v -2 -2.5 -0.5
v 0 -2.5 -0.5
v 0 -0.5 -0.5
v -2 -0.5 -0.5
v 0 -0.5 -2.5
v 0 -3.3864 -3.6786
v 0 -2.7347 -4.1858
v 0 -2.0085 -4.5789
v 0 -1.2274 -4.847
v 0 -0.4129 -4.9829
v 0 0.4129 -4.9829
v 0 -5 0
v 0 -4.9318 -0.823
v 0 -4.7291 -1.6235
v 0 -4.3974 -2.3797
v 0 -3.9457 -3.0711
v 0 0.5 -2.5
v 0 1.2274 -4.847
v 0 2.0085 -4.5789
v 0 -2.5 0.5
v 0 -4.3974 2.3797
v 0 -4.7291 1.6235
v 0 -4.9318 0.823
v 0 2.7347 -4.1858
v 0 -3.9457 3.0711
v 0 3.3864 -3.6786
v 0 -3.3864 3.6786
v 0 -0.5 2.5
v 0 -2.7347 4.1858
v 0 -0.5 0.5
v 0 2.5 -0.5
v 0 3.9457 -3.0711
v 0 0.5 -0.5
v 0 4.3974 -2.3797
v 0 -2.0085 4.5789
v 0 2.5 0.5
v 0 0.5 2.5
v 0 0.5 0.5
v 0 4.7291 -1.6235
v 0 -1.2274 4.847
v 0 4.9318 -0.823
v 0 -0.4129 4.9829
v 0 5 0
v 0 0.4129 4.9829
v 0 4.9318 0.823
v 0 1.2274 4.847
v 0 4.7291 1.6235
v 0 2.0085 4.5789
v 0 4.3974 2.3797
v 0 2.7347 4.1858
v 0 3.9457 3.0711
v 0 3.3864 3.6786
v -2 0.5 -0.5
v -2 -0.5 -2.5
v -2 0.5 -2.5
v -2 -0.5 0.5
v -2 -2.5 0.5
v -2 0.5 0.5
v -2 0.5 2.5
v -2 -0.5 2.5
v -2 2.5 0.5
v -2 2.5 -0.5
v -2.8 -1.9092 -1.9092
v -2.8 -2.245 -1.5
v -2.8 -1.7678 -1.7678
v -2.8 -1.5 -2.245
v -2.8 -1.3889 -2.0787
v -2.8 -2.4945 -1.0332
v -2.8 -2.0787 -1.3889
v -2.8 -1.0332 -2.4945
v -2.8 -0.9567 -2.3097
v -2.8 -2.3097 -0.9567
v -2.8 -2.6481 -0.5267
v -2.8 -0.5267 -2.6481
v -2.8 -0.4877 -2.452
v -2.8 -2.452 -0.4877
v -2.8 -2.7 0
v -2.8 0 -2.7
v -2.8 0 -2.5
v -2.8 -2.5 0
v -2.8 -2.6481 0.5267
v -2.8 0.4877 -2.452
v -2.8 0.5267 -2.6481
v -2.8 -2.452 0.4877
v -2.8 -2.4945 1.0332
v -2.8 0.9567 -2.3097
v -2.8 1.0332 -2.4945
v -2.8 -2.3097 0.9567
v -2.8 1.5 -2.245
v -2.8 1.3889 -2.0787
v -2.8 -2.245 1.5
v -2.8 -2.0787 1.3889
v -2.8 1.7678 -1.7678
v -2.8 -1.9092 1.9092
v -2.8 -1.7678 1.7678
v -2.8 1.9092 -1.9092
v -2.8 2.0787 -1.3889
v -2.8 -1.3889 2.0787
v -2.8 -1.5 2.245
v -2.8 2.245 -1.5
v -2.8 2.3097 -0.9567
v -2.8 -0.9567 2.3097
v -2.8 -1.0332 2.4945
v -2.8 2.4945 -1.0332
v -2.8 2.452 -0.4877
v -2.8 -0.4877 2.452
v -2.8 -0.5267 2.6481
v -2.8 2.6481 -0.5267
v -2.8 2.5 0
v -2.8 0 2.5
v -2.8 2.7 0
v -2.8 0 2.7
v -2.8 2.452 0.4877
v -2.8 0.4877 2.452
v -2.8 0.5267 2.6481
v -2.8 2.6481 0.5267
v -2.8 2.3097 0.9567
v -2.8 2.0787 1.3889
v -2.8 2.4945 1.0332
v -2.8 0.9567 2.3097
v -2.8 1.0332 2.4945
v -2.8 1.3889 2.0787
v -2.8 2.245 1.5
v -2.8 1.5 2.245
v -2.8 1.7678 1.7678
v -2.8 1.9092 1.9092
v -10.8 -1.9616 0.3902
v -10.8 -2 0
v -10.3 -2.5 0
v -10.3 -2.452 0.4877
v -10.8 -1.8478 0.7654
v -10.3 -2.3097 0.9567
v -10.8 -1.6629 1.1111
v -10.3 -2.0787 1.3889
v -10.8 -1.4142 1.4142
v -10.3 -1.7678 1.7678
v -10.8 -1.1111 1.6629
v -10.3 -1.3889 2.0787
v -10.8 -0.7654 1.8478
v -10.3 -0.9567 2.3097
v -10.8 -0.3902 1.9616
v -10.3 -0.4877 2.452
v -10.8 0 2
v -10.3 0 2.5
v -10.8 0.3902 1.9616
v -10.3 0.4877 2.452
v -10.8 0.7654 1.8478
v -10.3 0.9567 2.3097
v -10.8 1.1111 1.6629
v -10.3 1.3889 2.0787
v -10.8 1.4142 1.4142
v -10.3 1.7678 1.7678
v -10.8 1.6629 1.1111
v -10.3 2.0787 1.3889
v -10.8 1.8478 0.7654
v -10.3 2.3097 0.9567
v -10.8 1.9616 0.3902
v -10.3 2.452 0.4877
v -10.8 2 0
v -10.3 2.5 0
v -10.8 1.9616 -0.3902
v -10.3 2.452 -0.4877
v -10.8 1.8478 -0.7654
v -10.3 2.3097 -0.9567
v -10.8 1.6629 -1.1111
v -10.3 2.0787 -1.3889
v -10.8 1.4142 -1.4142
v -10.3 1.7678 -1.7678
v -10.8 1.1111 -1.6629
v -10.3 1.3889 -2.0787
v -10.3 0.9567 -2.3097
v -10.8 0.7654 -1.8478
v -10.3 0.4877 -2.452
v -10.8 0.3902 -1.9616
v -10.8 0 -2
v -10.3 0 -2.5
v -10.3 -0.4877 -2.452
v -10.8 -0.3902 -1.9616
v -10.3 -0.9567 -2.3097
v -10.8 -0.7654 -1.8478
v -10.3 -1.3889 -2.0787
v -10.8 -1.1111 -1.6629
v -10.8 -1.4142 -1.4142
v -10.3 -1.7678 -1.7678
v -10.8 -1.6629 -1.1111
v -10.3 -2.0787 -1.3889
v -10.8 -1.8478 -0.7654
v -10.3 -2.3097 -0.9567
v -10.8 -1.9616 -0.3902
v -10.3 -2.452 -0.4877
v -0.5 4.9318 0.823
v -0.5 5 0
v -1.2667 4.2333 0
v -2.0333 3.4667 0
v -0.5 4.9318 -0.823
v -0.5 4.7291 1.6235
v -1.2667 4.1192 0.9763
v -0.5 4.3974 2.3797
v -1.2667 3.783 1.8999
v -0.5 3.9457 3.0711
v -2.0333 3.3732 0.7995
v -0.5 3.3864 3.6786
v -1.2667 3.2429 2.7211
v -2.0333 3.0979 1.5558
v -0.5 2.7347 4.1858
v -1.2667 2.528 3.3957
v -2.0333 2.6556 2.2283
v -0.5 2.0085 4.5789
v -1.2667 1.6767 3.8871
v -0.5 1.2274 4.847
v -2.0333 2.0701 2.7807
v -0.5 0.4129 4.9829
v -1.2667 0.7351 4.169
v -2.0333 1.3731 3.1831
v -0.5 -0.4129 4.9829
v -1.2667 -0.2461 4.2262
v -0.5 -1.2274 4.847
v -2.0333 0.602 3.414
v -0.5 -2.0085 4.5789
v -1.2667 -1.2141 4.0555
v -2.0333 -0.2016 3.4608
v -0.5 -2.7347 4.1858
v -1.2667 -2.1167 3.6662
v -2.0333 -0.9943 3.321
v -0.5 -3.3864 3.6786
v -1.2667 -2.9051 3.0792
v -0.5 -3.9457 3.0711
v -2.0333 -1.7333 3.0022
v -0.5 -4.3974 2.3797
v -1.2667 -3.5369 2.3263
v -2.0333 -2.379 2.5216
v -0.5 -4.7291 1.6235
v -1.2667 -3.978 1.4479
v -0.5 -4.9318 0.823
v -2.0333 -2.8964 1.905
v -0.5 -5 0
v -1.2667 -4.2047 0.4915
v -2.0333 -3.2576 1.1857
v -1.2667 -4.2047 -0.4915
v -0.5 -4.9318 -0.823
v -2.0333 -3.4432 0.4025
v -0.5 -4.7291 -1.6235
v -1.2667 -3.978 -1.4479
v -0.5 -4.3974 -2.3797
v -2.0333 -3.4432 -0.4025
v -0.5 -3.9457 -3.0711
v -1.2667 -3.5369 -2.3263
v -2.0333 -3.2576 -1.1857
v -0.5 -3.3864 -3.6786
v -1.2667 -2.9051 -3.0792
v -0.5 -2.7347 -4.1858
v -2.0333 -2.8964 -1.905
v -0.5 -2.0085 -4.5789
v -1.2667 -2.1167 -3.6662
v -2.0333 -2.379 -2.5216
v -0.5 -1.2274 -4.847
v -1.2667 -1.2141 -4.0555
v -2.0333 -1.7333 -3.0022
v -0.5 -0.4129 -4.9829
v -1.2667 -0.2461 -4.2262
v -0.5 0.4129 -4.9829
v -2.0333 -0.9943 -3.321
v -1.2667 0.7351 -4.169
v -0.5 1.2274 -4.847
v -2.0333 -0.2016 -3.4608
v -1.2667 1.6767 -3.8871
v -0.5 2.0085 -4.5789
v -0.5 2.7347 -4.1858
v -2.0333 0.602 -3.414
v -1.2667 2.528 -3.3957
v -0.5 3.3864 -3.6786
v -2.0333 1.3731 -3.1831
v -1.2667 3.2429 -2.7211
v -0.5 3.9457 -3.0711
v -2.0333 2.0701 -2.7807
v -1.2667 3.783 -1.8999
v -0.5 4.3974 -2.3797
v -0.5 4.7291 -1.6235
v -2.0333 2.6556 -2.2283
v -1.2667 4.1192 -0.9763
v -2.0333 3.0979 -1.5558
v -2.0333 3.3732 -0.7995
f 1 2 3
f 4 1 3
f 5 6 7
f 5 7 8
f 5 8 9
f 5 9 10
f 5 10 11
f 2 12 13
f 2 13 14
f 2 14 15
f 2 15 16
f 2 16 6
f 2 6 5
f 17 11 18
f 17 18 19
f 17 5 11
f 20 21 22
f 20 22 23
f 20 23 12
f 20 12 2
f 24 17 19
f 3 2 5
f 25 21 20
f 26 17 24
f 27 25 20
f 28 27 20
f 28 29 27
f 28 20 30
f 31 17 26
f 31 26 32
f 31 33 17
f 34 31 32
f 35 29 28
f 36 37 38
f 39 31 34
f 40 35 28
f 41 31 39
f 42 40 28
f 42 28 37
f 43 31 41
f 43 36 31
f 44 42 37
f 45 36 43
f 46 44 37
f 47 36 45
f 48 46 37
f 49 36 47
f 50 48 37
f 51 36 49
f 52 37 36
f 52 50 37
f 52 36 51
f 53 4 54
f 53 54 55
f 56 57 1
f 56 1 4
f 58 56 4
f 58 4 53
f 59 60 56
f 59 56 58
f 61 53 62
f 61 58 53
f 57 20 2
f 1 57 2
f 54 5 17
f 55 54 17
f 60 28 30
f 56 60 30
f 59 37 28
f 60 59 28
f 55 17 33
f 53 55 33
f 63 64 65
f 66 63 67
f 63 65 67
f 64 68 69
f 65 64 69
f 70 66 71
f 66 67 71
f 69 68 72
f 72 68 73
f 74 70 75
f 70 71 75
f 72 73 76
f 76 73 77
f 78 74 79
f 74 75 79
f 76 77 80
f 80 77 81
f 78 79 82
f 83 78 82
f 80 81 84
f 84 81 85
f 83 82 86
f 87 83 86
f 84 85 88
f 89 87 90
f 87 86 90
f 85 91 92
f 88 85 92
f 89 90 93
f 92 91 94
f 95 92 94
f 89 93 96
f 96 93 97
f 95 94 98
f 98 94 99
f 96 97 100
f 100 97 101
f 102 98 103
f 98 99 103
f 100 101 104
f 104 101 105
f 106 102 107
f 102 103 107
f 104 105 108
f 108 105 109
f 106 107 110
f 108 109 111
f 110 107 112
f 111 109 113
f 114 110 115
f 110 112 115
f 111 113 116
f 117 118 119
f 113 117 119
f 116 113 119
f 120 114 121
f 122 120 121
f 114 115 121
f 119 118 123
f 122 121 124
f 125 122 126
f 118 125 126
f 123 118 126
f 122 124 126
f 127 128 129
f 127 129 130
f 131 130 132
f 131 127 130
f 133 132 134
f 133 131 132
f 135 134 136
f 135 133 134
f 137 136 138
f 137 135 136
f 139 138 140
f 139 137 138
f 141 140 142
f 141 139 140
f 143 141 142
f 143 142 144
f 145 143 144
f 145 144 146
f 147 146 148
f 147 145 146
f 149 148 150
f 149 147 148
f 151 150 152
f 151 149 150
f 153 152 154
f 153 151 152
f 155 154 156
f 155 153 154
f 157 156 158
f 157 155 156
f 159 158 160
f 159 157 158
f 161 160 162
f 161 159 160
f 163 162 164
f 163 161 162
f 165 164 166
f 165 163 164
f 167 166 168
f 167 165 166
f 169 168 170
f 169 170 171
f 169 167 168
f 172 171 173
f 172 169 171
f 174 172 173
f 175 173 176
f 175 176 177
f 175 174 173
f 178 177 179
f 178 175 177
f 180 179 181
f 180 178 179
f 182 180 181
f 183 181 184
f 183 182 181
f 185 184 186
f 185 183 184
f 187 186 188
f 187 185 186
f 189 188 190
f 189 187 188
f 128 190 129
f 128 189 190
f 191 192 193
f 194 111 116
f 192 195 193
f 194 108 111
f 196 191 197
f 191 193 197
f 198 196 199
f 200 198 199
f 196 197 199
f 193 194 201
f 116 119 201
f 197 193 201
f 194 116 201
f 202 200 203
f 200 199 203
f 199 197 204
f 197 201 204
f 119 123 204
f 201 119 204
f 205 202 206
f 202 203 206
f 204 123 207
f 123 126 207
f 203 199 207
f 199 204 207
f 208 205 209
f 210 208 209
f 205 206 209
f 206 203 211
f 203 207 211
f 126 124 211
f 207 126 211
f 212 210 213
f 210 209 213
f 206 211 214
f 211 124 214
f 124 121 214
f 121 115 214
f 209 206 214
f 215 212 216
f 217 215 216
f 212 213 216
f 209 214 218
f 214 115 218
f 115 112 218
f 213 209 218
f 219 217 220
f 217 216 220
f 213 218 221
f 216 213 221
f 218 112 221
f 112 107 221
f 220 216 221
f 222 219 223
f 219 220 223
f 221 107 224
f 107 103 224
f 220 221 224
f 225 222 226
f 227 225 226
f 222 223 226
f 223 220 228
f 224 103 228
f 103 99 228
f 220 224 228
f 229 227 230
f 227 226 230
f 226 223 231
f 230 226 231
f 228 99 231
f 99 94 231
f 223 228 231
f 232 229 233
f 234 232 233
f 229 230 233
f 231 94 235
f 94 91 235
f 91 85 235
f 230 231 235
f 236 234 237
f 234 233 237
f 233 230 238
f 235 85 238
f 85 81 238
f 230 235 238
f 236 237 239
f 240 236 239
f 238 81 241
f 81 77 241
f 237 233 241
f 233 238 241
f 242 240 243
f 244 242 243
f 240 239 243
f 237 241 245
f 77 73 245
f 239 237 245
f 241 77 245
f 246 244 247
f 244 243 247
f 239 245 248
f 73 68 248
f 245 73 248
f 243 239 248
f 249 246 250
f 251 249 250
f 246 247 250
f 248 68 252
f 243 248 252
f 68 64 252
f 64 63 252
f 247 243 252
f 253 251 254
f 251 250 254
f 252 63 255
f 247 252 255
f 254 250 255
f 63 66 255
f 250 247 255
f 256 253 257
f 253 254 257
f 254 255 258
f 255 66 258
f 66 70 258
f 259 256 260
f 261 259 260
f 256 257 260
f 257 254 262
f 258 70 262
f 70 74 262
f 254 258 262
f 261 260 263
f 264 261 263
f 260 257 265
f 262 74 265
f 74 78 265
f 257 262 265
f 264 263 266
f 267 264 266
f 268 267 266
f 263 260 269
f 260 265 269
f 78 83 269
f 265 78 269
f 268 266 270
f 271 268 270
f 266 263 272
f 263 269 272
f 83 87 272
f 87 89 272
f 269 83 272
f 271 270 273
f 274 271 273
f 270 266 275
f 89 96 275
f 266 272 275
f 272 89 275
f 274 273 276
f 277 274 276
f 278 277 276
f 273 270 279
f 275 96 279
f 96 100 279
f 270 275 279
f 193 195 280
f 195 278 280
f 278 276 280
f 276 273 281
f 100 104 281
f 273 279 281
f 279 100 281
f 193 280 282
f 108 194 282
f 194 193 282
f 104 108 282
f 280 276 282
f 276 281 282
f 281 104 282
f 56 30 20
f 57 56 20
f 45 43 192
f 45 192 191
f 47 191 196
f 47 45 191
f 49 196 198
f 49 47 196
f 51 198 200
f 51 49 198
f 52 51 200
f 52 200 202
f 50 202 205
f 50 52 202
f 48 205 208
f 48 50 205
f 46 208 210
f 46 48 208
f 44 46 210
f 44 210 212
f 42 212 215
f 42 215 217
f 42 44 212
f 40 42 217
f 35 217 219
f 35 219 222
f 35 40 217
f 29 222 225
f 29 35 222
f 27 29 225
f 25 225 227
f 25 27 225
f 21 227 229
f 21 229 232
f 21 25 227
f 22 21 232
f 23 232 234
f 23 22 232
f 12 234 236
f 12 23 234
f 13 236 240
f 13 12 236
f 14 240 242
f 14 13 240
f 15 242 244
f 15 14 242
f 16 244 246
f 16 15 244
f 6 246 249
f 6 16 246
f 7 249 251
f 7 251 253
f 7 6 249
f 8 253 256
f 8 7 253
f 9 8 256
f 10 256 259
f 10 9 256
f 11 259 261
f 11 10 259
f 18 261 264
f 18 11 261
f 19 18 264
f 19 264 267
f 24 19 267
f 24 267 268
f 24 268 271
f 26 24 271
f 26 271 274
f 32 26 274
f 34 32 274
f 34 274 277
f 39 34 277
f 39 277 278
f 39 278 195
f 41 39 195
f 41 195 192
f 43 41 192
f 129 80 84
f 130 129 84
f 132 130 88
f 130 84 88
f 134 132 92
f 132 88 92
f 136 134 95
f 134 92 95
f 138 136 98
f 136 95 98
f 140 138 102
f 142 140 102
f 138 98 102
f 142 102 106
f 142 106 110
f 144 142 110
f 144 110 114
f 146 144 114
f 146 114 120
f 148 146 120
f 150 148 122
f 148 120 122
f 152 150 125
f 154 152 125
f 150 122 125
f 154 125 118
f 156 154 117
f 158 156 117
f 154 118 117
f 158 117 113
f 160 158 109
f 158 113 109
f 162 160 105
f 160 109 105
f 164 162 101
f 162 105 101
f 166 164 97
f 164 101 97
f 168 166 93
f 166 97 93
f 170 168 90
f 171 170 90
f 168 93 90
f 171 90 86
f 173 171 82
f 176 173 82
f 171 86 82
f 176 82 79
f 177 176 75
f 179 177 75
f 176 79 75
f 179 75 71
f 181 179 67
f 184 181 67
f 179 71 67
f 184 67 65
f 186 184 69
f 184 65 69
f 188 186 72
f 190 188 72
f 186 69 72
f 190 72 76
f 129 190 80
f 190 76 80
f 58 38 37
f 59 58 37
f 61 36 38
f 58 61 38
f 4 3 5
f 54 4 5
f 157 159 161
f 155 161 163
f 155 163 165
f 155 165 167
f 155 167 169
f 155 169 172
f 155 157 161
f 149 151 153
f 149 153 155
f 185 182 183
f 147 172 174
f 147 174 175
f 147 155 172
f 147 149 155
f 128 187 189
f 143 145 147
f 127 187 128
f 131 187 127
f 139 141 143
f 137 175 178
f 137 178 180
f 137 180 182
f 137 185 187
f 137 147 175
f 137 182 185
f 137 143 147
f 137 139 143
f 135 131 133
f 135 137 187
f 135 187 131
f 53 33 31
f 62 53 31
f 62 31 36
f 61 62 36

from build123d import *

# Parameters (mm, degrees)
F0_R     = 5
F1_DEPTH = 2.8
F2_R     = 2.5
F3_DEPTH = 8
F4_SIZE  = 2.3
F5_SIZE  = 0.5
F7_DEPTH = 2


with BuildPart() as f1:
    # F0 (on Right) → F1 (new body)
    with BuildSketch(Plane.YZ):
        Circle(F0_R)
    extrude(amount=-F1_DEPTH)

    # F2 (on face) → F3 (join)
    with BuildSketch(Plane(origin=(-2.8, 0, 0), x_dir=(0, -1, 0), z_dir=(-1, 0, 0))):
        Circle(F2_R)
    extrude(amount=F3_DEPTH)

    # F4
    f4_edges = [f1.edges().sort_by_distance(p)[0] for p in [
        (-2.8, -5, 0),
    ]]
    chamfer(f4_edges, length=F4_SIZE)

    # F5
    f5_edges = [f1.edges().sort_by_distance(p)[0] for p in [
        (-10.8, 2.5, 0),
    ]]
    chamfer(f5_edges, length=F5_SIZE)

    # F6 (on face) → F7 (cut)
    with BuildSketch(Plane.YZ):
        Polygon((0.5, 2.5), (0, 2.5), (-0.5, 2.5), (-0.5, 0.5), (-2.5, 0.5), (-2.5, 0), (-2.5, -0.5), (-0.5, -0.5), (-0.5, -2.5), (0, -2.5), (0.5, -2.5), (0.5, -0.5), (2.5, -0.5), (2.5, 0), (2.5, 0.5), (0.5, 0.5), align=None)
    extrude(amount=-F7_DEPTH, mode=Mode.SUBTRACT)


solid = f1.part
